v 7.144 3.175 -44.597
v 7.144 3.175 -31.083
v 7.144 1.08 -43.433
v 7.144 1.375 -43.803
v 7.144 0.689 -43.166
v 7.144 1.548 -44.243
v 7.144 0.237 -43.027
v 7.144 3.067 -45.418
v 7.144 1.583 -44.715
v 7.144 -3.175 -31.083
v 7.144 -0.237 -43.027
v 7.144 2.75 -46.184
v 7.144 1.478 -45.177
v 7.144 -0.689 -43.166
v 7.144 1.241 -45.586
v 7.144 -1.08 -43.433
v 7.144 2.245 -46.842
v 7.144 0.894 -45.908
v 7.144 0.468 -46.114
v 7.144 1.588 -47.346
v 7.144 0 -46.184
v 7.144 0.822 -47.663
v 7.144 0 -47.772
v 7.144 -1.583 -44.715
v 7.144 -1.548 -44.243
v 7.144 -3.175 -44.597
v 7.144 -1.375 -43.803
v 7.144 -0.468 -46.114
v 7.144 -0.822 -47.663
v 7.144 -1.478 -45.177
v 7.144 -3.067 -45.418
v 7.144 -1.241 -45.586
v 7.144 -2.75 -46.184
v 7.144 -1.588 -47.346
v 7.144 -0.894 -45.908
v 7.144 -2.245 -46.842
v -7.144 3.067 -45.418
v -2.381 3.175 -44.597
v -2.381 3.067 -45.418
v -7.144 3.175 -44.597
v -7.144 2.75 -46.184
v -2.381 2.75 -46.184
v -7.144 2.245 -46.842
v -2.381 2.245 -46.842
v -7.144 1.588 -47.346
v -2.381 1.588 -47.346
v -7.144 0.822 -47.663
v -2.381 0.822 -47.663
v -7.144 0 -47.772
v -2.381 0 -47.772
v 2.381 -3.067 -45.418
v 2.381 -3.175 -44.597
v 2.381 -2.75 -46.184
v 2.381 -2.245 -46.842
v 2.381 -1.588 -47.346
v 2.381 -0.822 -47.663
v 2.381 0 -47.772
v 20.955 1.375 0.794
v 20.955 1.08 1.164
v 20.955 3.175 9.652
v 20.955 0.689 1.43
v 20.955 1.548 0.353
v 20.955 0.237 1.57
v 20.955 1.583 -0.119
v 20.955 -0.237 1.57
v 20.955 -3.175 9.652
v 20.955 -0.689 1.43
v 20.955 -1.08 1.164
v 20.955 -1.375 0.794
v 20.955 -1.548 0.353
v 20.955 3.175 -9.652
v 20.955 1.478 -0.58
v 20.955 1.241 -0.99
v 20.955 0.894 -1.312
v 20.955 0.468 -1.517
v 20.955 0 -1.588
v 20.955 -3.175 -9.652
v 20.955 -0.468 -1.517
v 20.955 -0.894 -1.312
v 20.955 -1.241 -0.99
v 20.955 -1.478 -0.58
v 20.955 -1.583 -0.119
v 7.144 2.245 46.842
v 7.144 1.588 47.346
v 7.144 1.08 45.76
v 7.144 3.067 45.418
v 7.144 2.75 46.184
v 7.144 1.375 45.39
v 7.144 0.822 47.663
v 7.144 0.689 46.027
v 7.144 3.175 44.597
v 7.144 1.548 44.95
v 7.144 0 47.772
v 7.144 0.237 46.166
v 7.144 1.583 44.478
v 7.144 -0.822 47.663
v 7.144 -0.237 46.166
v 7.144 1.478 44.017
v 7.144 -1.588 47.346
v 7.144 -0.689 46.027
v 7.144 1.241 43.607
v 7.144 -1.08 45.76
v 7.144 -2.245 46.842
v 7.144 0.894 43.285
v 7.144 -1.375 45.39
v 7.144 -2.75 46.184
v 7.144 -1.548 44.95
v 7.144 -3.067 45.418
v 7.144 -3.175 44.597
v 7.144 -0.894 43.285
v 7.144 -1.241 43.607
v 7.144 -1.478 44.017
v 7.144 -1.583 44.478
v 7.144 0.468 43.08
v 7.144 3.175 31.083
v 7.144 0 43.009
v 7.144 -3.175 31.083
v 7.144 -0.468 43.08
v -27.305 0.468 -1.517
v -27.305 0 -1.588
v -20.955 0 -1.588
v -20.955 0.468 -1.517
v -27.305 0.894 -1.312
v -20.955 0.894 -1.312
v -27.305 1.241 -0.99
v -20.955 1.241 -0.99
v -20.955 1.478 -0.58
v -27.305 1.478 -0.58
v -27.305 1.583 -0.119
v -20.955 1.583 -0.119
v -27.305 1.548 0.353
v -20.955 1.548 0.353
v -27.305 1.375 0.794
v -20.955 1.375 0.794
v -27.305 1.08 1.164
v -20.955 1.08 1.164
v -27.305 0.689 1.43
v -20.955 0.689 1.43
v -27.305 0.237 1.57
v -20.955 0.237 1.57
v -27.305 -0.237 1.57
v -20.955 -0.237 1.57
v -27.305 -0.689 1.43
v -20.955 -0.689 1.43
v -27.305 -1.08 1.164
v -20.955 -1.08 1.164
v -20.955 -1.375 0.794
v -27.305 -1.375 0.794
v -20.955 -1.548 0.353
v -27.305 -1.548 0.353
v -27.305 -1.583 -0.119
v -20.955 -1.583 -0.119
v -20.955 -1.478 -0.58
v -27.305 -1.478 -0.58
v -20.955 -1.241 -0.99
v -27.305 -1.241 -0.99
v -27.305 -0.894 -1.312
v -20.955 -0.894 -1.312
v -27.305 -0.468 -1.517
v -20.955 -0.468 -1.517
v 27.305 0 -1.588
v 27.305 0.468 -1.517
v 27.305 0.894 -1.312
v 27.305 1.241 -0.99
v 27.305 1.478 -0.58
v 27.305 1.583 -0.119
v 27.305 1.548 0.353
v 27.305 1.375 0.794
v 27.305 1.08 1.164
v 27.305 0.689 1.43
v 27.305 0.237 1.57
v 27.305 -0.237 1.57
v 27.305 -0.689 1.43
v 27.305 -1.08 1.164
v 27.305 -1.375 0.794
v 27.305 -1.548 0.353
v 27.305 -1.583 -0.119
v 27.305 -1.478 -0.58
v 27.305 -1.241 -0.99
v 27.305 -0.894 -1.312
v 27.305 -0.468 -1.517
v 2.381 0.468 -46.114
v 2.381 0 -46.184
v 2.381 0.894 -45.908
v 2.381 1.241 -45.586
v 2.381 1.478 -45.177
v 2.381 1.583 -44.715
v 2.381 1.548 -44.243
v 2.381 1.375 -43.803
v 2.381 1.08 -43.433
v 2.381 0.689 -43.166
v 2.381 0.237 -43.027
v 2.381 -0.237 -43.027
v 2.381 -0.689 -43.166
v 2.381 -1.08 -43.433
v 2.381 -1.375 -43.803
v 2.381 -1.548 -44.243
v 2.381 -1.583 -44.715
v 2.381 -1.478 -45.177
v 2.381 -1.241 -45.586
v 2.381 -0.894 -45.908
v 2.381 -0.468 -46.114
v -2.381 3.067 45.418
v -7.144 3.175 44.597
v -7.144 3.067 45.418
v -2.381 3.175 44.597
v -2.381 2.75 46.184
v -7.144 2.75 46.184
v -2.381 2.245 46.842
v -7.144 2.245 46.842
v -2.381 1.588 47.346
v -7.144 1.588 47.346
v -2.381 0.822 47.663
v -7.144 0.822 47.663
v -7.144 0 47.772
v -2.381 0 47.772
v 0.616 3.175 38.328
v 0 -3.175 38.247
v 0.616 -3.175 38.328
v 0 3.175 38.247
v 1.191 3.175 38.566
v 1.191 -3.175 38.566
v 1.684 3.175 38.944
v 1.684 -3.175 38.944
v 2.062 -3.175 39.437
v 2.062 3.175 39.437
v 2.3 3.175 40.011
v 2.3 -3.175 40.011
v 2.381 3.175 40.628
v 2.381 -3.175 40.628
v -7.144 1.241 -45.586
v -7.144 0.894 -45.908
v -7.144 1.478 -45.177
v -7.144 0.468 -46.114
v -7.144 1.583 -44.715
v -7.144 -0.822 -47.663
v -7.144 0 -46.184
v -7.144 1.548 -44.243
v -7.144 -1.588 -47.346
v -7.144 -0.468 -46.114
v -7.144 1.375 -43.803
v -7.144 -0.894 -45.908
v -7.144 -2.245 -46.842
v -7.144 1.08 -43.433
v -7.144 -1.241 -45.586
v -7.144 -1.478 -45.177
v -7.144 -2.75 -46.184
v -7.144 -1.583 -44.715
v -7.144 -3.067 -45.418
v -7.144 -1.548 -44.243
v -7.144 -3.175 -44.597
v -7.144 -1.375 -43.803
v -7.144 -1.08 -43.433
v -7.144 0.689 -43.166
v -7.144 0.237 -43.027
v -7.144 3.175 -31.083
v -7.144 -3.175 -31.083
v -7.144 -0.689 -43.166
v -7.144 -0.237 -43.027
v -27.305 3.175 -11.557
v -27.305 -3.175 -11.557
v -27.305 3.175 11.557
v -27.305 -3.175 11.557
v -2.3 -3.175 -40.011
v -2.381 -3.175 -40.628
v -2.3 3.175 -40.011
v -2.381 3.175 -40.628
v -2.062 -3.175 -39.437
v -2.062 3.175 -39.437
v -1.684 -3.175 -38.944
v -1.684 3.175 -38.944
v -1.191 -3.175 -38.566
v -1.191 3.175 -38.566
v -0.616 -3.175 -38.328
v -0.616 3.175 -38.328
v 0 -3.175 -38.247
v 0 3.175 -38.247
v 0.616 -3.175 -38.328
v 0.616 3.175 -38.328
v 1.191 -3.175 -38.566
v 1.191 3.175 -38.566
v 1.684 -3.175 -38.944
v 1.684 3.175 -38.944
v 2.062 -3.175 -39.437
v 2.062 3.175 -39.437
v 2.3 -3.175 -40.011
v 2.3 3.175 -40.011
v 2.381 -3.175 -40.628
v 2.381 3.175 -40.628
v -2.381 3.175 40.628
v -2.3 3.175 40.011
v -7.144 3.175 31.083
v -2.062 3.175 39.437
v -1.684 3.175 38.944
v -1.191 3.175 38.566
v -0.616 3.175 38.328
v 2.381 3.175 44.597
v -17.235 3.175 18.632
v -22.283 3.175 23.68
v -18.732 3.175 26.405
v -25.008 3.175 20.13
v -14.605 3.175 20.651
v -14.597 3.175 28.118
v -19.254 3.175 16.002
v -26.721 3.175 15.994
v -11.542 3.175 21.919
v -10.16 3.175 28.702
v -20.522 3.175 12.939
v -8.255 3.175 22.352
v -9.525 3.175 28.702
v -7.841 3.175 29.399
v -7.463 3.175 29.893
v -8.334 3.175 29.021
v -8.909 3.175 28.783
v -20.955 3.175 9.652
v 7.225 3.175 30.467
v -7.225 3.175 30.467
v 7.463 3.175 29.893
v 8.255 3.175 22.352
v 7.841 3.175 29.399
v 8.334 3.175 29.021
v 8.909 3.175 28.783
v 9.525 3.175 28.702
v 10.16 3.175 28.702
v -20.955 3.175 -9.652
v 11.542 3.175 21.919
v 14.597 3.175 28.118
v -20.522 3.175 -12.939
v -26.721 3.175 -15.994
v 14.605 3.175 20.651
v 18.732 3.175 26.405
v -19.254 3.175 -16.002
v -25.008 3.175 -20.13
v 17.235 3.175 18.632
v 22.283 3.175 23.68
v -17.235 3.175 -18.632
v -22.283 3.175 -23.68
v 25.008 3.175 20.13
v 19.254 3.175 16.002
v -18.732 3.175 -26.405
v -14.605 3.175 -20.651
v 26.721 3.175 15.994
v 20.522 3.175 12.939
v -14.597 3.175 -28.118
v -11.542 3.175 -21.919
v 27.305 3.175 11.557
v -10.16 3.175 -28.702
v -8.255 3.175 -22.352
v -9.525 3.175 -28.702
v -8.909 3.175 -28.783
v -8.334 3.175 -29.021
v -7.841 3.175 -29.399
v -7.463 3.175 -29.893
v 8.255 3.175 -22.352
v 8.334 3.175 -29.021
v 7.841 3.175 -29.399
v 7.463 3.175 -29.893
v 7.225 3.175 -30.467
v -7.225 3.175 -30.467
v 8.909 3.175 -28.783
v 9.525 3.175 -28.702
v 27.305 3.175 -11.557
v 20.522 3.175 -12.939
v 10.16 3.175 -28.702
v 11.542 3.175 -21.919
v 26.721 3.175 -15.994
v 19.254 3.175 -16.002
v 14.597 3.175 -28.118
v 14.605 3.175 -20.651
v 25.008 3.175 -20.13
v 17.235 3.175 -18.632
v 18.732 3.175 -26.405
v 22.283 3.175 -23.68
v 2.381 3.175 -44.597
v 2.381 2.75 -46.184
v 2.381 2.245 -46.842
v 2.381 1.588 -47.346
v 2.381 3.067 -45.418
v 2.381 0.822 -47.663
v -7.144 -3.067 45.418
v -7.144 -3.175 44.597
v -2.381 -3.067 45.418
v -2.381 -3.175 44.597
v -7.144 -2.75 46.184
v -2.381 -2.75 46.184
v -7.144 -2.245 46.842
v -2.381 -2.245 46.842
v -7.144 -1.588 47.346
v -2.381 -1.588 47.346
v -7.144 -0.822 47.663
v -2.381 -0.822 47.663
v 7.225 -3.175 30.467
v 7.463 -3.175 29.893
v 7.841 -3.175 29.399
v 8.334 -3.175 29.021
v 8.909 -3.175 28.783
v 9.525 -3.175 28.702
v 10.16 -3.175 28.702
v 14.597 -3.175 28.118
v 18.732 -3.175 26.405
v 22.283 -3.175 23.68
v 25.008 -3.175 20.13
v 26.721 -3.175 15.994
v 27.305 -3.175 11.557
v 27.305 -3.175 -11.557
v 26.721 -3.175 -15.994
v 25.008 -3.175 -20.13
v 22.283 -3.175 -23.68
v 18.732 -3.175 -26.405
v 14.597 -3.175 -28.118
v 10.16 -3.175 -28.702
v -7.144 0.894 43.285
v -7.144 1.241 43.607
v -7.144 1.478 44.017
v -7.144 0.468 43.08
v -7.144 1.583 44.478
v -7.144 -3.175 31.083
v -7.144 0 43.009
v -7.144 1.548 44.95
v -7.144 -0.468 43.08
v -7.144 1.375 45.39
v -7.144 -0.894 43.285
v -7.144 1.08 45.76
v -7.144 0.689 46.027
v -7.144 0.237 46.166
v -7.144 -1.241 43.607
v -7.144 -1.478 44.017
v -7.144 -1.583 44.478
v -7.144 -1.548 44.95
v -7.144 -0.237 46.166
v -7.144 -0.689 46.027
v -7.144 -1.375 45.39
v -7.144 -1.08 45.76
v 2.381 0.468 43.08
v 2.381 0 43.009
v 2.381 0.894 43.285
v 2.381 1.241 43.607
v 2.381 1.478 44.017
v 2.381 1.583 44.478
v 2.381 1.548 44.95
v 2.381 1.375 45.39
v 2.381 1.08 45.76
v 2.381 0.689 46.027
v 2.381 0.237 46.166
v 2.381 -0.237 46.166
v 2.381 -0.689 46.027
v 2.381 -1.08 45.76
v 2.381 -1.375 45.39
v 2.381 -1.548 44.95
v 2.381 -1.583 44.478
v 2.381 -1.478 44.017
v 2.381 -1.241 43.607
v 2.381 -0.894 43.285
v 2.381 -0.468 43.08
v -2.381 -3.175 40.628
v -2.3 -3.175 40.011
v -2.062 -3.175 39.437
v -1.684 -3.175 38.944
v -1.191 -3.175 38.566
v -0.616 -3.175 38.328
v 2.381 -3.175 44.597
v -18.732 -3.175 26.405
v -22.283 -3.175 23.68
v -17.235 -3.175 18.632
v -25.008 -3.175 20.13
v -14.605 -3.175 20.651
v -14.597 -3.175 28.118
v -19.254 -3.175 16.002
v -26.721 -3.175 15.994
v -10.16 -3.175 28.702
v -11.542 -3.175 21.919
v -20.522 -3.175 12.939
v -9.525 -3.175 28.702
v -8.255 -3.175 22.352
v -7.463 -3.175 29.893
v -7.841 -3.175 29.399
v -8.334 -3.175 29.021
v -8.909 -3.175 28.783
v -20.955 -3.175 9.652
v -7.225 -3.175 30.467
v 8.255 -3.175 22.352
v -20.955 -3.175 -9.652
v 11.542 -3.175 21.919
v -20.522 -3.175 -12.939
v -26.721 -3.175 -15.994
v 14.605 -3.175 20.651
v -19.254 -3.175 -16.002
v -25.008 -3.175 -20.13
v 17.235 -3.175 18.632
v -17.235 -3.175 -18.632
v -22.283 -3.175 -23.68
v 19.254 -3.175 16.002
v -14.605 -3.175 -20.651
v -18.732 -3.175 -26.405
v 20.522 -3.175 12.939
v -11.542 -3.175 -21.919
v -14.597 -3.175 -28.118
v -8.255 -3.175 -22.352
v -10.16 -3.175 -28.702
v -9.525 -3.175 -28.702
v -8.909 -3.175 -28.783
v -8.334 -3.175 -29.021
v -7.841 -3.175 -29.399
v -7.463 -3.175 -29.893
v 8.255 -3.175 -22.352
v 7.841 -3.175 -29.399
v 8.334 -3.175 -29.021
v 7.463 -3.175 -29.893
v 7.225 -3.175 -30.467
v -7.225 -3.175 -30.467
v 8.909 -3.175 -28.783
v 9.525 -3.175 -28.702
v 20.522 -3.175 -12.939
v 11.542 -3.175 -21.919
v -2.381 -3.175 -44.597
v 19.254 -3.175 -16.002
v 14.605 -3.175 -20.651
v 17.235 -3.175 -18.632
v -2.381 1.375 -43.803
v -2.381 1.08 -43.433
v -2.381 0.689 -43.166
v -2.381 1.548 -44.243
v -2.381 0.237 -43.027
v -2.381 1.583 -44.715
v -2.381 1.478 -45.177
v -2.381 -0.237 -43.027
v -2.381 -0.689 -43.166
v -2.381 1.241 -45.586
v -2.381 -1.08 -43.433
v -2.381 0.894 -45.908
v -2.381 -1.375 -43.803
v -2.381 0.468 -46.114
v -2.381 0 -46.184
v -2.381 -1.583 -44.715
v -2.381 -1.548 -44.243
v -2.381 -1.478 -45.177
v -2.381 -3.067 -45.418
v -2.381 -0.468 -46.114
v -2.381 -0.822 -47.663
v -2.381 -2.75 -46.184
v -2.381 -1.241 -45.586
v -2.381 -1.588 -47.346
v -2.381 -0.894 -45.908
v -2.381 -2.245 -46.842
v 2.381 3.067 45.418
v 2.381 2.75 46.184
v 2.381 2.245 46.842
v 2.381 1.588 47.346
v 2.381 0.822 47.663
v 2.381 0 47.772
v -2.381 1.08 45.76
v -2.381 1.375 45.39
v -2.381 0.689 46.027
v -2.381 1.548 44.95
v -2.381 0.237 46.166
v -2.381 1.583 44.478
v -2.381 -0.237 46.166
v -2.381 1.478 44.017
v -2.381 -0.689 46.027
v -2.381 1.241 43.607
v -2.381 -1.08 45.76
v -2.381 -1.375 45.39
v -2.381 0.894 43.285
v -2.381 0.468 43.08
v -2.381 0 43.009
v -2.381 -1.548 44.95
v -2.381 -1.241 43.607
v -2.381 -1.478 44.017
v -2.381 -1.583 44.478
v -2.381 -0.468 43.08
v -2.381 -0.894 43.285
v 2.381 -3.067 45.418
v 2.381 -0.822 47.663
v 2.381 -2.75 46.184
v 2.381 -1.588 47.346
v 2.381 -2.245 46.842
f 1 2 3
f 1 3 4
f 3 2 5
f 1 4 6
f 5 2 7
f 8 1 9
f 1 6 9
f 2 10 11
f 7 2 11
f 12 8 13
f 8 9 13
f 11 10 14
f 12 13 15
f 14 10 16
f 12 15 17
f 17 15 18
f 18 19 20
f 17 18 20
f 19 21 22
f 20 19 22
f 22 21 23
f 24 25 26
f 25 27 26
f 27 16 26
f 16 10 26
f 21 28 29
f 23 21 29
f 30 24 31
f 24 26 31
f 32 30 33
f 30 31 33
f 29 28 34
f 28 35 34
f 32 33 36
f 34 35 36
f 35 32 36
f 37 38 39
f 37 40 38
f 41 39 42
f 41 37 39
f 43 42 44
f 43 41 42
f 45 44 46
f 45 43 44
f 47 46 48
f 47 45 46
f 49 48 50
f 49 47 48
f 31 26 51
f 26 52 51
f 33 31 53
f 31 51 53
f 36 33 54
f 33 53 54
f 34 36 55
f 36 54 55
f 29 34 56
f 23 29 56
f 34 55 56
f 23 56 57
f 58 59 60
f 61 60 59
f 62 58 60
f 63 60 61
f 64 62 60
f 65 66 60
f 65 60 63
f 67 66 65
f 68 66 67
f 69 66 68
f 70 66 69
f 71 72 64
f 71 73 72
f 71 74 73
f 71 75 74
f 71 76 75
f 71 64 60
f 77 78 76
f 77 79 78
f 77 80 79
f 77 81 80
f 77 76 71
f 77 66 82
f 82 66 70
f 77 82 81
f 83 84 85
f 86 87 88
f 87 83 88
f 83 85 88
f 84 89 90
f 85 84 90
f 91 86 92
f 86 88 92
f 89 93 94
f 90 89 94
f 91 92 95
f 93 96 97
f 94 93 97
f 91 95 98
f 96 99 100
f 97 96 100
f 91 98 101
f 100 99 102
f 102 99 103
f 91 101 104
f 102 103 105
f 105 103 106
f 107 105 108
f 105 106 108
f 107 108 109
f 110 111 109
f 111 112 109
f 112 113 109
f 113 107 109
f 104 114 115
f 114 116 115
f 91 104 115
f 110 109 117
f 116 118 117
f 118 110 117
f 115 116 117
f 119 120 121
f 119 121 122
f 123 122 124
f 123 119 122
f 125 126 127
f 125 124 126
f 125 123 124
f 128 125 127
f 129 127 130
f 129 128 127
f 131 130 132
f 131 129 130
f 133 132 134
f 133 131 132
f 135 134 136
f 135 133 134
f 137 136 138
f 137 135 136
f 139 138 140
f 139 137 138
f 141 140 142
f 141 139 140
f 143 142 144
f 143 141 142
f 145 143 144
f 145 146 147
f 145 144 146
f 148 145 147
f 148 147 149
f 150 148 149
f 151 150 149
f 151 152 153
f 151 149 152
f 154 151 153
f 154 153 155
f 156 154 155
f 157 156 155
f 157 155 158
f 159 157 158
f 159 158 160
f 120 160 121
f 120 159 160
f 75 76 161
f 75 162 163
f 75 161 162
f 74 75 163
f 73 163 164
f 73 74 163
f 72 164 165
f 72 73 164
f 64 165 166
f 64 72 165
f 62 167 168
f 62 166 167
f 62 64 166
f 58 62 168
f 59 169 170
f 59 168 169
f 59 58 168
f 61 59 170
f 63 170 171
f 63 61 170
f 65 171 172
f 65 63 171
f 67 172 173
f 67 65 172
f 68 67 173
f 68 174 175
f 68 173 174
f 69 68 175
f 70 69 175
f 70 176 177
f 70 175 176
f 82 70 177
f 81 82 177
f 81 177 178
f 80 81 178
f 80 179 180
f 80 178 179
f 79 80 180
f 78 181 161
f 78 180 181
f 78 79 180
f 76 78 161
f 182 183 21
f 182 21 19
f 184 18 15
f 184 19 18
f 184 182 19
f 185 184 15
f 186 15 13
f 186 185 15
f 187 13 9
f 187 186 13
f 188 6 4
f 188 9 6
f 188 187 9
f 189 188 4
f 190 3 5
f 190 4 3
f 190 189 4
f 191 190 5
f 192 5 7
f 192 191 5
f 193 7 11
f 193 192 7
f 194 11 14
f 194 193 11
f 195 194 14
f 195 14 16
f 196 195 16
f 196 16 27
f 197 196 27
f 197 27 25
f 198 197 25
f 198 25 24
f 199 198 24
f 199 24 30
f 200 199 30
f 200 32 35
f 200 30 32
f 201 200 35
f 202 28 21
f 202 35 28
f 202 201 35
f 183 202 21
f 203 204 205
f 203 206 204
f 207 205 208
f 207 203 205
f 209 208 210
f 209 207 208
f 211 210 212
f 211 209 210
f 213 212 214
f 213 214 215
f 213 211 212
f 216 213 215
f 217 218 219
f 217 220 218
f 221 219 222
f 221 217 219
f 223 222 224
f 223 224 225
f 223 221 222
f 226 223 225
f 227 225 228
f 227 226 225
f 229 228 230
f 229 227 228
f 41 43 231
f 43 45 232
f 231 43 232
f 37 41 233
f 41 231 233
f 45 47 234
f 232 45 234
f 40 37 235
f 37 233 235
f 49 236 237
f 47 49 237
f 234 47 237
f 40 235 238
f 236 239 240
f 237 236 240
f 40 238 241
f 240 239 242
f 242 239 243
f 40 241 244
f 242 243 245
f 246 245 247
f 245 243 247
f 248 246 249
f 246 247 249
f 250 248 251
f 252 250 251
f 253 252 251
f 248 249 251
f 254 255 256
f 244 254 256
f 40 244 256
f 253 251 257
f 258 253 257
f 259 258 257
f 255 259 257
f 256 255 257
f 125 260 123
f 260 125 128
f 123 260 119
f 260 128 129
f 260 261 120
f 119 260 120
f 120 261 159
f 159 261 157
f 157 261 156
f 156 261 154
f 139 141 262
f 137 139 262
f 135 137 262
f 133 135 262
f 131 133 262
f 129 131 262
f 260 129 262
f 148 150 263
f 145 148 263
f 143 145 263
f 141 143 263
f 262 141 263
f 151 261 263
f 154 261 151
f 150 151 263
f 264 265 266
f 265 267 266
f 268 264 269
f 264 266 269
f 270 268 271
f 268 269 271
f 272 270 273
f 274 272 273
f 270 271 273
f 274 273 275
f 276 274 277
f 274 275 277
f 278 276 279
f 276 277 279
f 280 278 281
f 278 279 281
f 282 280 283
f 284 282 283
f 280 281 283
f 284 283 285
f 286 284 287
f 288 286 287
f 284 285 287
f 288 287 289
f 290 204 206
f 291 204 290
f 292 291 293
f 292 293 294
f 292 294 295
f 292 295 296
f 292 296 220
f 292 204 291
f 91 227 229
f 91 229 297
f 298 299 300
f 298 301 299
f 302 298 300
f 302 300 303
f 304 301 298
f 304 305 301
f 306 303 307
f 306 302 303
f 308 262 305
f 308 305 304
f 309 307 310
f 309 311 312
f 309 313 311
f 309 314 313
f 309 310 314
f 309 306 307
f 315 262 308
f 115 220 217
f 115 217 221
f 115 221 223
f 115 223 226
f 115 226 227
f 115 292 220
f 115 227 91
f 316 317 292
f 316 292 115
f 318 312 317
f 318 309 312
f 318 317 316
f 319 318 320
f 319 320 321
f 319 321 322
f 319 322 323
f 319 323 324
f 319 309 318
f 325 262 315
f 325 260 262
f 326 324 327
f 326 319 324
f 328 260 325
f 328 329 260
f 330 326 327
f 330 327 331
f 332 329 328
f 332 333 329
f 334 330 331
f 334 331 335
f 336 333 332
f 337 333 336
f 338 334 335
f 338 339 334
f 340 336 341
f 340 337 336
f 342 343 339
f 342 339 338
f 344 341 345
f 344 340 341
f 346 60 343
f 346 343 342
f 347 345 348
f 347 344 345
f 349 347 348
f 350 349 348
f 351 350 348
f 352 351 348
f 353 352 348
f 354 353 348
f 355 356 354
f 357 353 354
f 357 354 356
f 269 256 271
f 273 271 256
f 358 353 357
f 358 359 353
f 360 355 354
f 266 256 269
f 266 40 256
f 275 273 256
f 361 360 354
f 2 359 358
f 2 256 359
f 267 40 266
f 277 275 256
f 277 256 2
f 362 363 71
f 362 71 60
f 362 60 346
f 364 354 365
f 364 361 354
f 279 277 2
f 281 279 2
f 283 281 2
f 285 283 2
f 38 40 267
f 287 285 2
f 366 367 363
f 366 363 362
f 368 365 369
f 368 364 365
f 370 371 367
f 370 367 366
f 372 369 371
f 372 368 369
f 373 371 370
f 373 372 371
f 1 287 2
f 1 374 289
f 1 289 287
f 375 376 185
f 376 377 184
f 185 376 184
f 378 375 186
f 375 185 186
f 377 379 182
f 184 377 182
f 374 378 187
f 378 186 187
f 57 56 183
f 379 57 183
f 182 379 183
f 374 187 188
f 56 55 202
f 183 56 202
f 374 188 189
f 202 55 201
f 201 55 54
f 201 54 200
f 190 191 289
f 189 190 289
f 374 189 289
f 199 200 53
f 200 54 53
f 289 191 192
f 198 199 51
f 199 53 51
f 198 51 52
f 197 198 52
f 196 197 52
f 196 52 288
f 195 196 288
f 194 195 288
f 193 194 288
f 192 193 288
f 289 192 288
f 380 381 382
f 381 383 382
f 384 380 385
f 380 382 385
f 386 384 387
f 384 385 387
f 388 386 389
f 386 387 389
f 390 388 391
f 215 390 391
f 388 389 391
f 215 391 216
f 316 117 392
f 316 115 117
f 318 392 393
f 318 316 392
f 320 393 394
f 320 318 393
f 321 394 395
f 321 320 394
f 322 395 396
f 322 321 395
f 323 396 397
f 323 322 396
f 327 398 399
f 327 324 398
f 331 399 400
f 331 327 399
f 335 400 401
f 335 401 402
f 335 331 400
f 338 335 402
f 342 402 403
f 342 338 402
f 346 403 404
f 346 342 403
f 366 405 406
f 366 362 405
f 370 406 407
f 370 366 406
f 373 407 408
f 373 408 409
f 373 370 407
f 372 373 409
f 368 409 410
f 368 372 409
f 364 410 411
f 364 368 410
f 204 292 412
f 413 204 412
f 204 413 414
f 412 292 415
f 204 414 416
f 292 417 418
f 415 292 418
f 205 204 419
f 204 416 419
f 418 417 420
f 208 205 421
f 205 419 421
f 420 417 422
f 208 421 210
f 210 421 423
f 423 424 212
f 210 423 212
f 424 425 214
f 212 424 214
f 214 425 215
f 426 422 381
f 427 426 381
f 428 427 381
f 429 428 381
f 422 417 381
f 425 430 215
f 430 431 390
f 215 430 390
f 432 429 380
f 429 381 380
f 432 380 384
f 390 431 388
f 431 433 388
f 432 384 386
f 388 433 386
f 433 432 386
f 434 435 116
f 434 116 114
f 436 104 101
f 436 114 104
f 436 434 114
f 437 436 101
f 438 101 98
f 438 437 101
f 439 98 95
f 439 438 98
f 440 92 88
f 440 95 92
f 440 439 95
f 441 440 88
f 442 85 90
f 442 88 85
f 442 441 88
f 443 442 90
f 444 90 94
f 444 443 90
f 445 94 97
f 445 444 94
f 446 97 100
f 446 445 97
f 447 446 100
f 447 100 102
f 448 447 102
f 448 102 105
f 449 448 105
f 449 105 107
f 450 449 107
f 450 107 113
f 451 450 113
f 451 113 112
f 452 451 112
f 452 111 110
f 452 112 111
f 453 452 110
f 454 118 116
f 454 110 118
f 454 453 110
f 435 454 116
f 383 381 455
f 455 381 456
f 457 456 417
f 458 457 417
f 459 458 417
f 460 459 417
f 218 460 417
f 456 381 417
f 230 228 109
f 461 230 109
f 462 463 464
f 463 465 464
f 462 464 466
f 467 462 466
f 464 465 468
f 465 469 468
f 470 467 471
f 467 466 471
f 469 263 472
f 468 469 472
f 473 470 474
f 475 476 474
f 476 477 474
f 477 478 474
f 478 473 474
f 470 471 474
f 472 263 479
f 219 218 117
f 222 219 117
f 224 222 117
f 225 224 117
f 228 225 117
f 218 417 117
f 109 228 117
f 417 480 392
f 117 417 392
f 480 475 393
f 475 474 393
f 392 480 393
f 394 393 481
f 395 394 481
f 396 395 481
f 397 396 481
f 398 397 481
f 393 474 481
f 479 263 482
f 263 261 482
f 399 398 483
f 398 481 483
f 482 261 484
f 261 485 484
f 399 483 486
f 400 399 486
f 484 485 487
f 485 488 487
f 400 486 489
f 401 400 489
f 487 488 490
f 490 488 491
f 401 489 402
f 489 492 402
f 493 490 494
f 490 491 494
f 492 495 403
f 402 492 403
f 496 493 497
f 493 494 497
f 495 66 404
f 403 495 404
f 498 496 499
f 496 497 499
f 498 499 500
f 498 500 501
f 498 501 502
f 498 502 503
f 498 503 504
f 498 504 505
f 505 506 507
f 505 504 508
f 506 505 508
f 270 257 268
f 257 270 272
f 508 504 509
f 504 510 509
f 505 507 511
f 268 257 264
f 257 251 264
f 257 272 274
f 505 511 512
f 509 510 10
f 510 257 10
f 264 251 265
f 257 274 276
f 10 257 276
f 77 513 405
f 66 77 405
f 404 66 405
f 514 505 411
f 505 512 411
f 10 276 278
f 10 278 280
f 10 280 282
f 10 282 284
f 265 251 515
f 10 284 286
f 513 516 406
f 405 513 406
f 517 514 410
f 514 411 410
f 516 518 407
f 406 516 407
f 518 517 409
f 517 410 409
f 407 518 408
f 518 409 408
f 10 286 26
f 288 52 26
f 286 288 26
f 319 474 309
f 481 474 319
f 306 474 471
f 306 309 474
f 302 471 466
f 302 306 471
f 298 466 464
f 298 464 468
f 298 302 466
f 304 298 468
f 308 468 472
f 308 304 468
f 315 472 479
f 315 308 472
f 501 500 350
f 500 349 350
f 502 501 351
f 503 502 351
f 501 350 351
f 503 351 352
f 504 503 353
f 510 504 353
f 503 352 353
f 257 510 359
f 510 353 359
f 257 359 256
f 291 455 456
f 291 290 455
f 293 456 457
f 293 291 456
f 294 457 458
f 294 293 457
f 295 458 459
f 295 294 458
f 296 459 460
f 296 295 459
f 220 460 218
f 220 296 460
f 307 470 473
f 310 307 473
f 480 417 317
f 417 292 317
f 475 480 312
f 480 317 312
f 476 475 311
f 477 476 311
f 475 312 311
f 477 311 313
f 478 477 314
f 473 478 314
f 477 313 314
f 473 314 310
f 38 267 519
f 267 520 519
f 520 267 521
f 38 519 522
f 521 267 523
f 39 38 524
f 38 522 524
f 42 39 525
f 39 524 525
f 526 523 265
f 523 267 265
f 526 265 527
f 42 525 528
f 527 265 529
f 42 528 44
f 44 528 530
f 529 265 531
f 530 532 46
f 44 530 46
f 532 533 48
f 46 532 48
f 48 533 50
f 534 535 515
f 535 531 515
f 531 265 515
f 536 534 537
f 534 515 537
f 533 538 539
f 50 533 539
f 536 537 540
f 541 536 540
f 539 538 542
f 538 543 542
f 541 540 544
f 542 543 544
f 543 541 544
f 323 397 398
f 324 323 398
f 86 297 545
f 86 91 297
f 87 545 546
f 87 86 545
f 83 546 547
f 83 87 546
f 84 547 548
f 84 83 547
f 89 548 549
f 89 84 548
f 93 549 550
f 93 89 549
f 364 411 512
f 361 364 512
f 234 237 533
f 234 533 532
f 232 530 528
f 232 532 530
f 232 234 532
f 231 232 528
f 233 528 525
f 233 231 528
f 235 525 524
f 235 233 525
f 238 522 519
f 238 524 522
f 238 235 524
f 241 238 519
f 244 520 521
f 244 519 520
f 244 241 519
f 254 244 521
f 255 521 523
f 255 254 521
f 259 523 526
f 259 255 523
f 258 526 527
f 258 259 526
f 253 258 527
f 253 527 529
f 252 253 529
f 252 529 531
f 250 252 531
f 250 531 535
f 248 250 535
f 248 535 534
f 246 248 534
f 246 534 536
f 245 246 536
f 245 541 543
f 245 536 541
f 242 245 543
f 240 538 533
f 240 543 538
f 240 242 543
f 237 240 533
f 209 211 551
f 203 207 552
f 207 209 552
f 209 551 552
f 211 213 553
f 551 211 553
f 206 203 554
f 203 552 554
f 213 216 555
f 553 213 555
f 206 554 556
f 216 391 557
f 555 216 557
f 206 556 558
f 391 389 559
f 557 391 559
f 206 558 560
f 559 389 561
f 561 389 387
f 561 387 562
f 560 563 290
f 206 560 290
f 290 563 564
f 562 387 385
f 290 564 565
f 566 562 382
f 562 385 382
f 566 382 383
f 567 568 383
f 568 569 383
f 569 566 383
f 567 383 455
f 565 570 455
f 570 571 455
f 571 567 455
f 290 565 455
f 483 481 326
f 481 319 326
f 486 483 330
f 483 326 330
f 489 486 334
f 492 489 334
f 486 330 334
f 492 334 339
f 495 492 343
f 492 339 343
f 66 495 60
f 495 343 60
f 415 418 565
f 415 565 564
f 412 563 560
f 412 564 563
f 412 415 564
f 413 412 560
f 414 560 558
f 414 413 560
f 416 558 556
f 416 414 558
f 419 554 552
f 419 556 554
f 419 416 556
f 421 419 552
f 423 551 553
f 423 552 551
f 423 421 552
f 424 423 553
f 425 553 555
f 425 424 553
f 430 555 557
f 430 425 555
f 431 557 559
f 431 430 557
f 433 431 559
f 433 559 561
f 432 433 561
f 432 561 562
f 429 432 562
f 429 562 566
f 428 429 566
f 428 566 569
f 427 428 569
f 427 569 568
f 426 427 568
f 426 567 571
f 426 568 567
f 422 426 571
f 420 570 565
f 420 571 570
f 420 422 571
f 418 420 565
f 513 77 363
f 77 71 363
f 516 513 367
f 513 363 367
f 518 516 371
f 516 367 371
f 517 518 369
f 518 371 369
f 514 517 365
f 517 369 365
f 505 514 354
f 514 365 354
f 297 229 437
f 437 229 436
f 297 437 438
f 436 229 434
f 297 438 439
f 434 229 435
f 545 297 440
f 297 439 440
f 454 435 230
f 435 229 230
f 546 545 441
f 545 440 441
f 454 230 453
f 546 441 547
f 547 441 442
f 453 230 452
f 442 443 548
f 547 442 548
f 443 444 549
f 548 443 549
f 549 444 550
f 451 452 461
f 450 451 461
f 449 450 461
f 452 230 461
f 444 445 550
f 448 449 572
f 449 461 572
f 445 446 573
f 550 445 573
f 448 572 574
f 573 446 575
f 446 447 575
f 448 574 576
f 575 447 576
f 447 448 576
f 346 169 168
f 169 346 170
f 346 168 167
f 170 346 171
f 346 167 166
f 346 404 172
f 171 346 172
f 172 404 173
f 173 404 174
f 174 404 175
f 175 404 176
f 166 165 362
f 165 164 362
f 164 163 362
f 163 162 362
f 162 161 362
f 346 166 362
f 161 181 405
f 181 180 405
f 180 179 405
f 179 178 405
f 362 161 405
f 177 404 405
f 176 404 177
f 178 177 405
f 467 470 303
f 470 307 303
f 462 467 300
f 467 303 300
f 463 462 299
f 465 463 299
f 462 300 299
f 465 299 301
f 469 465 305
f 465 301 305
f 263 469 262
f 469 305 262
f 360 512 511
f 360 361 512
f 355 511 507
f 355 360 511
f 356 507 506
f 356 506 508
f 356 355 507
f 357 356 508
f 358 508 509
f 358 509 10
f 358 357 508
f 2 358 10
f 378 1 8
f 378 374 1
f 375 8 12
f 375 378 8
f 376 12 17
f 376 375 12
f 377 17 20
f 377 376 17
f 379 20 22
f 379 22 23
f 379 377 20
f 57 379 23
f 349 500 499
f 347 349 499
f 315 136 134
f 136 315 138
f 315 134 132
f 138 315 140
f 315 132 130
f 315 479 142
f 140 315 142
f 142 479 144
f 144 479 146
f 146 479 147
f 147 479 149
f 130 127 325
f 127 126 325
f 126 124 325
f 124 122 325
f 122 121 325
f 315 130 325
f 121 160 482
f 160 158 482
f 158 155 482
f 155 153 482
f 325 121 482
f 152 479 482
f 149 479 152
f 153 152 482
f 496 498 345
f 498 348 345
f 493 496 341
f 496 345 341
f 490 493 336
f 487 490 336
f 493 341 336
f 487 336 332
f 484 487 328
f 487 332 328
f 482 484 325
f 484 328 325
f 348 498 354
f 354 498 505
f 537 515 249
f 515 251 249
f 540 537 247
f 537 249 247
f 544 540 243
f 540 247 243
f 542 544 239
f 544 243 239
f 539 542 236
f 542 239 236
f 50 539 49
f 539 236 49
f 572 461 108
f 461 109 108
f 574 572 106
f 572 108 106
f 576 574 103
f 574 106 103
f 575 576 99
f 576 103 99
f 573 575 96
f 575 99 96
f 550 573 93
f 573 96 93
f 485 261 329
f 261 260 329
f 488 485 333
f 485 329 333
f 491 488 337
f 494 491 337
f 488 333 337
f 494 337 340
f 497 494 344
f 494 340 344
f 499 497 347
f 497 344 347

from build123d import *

# Parameters (mm, degrees)
BOSS_EXTRUDE1_DEPTH      = 3.175
BOSS_EXTRUDE1_DEPTH_BACK = 3.175
SKETCH1_W                = 41.91
SKETCH1_H                = 44.704
CUT_EXTRUDE1_DEPTH       = 56.115992998
CUT_EXTRUDE1_DEPTH_BACK  = 56.115992998
SKETCH2_R                = 1.5875
FILLET1_R                = 3.175
FILLET2_R                = 12.7
FILLET4_R                = 2.38125
FILLET3_R                = 17.145


with BuildPart() as part:
    # Sketch1 → Boss-Extrude1 (new, two sides: drawn at the far end of the back side and taken through both)
    with BuildSketch(Plane(origin=(0, 0, 0), x_dir=(1, 0, 0), z_dir=(0, 1, 0)).offset(-BOSS_EXTRUDE1_DEPTH_BACK)):
        Polygon((-2.38125, -38.2466342), (2.38125, -38.2466342), (2.38125, -47.7716342), (7.14375, -47.7716342), (7.14375, -28.702), (27.305, -28.702), (27.305, 28.702), (7.14375, 28.702), (7.14375, 47.7716342), (2.38125, 47.7716342), (2.38125, 38.2466342), (-2.38125, 38.2466342), (-2.38125, 47.7716342), (-7.14375, 47.7716342), (-7.14375, 28.702), (-27.305, 28.702), (-27.305, -28.702), (-7.14375, -28.702), (-7.14375, -47.7716342), (-2.38125, -47.7716342), align=None)
        Rectangle(SKETCH1_W, SKETCH1_H, mode=Mode.SUBTRACT)
    extrude(amount=BOSS_EXTRUDE1_DEPTH + BOSS_EXTRUDE1_DEPTH_BACK)

    # Sketch2 → Cut-Extrude1 (cut, two sides: drawn at the far end of the back side and taken through both)
    with BuildSketch(Plane(origin=(0, 0, 0), x_dir=(0, 0, -1), z_dir=(1, 0, 0)).offset(-CUT_EXTRUDE1_DEPTH_BACK)):
        Circle(SKETCH2_R)
        with Locations((44.5966342, 0)):
            Circle(SKETCH2_R)
        with Locations((-44.5966342, 0)):
            Circle(SKETCH2_R)
    extrude(amount=CUT_EXTRUDE1_DEPTH + CUT_EXTRUDE1_DEPTH_BACK, mode=Mode.SUBTRACT)

    # Fillet1
    fillet1_edges = [part.edges().sort_by_distance(p)[0] for p in [
        (-4.7625, -3.175, 47.7716342),
        (-4.7625, 3.175, 47.7716342),
        (4.7625, 3.175, 47.7716342),
        (4.7625, -3.175, 47.7716342),
        (4.7625, -3.175, -47.7716342),
        (-4.7625, -3.175, -47.7716342),
        (4.7625, 3.175, -47.7716342),
        (-4.7625, 3.175, -47.7716342),
    ]]
    fillet(fillet1_edges, radius=FILLET1_R - 0.0001)  # a hair under: the kernel refuses the full size

    # Fillet2
    fillet2_edges = [part.edges().sort_by_distance(p)[0] for p in [
        (-20.955, 0, -22.352),
        (20.955, 0, -22.352),
        (20.955, 0, 22.352),
        (-20.955, 0, 22.352),
    ]]
    fillet(fillet2_edges, radius=FILLET2_R)

    # Fillet4
    fillet4_edges = [part.edges().sort_by_distance(p)[0] for p in [
        (7.14375, 0, 28.702),
        (-7.14375, 0, 28.702),
        (7.14375, 0, -28.702),
        (-7.14375, 0, -28.702),
        (-2.38125, 0, -38.2466342),
        (2.38125, 0, -38.2466342),
        (-2.38125, 0, 38.2466342),
        (2.38125, 0, 38.2466342),
    ]]
    fillet(fillet4_edges, radius=FILLET4_R - 0.0001)  # a hair under: the kernel refuses the full size

    # Fillet3
    fillet3_edges = [part.edges().sort_by_distance(p)[0] for p in [
        (-27.305, 0, 28.702),
        (-27.305, 0, -28.702),
        (27.305, 0, -28.702),
        (27.305, 0, 28.702),
    ]]
    fillet(fillet3_edges, radius=FILLET3_R)


solid = part.part
